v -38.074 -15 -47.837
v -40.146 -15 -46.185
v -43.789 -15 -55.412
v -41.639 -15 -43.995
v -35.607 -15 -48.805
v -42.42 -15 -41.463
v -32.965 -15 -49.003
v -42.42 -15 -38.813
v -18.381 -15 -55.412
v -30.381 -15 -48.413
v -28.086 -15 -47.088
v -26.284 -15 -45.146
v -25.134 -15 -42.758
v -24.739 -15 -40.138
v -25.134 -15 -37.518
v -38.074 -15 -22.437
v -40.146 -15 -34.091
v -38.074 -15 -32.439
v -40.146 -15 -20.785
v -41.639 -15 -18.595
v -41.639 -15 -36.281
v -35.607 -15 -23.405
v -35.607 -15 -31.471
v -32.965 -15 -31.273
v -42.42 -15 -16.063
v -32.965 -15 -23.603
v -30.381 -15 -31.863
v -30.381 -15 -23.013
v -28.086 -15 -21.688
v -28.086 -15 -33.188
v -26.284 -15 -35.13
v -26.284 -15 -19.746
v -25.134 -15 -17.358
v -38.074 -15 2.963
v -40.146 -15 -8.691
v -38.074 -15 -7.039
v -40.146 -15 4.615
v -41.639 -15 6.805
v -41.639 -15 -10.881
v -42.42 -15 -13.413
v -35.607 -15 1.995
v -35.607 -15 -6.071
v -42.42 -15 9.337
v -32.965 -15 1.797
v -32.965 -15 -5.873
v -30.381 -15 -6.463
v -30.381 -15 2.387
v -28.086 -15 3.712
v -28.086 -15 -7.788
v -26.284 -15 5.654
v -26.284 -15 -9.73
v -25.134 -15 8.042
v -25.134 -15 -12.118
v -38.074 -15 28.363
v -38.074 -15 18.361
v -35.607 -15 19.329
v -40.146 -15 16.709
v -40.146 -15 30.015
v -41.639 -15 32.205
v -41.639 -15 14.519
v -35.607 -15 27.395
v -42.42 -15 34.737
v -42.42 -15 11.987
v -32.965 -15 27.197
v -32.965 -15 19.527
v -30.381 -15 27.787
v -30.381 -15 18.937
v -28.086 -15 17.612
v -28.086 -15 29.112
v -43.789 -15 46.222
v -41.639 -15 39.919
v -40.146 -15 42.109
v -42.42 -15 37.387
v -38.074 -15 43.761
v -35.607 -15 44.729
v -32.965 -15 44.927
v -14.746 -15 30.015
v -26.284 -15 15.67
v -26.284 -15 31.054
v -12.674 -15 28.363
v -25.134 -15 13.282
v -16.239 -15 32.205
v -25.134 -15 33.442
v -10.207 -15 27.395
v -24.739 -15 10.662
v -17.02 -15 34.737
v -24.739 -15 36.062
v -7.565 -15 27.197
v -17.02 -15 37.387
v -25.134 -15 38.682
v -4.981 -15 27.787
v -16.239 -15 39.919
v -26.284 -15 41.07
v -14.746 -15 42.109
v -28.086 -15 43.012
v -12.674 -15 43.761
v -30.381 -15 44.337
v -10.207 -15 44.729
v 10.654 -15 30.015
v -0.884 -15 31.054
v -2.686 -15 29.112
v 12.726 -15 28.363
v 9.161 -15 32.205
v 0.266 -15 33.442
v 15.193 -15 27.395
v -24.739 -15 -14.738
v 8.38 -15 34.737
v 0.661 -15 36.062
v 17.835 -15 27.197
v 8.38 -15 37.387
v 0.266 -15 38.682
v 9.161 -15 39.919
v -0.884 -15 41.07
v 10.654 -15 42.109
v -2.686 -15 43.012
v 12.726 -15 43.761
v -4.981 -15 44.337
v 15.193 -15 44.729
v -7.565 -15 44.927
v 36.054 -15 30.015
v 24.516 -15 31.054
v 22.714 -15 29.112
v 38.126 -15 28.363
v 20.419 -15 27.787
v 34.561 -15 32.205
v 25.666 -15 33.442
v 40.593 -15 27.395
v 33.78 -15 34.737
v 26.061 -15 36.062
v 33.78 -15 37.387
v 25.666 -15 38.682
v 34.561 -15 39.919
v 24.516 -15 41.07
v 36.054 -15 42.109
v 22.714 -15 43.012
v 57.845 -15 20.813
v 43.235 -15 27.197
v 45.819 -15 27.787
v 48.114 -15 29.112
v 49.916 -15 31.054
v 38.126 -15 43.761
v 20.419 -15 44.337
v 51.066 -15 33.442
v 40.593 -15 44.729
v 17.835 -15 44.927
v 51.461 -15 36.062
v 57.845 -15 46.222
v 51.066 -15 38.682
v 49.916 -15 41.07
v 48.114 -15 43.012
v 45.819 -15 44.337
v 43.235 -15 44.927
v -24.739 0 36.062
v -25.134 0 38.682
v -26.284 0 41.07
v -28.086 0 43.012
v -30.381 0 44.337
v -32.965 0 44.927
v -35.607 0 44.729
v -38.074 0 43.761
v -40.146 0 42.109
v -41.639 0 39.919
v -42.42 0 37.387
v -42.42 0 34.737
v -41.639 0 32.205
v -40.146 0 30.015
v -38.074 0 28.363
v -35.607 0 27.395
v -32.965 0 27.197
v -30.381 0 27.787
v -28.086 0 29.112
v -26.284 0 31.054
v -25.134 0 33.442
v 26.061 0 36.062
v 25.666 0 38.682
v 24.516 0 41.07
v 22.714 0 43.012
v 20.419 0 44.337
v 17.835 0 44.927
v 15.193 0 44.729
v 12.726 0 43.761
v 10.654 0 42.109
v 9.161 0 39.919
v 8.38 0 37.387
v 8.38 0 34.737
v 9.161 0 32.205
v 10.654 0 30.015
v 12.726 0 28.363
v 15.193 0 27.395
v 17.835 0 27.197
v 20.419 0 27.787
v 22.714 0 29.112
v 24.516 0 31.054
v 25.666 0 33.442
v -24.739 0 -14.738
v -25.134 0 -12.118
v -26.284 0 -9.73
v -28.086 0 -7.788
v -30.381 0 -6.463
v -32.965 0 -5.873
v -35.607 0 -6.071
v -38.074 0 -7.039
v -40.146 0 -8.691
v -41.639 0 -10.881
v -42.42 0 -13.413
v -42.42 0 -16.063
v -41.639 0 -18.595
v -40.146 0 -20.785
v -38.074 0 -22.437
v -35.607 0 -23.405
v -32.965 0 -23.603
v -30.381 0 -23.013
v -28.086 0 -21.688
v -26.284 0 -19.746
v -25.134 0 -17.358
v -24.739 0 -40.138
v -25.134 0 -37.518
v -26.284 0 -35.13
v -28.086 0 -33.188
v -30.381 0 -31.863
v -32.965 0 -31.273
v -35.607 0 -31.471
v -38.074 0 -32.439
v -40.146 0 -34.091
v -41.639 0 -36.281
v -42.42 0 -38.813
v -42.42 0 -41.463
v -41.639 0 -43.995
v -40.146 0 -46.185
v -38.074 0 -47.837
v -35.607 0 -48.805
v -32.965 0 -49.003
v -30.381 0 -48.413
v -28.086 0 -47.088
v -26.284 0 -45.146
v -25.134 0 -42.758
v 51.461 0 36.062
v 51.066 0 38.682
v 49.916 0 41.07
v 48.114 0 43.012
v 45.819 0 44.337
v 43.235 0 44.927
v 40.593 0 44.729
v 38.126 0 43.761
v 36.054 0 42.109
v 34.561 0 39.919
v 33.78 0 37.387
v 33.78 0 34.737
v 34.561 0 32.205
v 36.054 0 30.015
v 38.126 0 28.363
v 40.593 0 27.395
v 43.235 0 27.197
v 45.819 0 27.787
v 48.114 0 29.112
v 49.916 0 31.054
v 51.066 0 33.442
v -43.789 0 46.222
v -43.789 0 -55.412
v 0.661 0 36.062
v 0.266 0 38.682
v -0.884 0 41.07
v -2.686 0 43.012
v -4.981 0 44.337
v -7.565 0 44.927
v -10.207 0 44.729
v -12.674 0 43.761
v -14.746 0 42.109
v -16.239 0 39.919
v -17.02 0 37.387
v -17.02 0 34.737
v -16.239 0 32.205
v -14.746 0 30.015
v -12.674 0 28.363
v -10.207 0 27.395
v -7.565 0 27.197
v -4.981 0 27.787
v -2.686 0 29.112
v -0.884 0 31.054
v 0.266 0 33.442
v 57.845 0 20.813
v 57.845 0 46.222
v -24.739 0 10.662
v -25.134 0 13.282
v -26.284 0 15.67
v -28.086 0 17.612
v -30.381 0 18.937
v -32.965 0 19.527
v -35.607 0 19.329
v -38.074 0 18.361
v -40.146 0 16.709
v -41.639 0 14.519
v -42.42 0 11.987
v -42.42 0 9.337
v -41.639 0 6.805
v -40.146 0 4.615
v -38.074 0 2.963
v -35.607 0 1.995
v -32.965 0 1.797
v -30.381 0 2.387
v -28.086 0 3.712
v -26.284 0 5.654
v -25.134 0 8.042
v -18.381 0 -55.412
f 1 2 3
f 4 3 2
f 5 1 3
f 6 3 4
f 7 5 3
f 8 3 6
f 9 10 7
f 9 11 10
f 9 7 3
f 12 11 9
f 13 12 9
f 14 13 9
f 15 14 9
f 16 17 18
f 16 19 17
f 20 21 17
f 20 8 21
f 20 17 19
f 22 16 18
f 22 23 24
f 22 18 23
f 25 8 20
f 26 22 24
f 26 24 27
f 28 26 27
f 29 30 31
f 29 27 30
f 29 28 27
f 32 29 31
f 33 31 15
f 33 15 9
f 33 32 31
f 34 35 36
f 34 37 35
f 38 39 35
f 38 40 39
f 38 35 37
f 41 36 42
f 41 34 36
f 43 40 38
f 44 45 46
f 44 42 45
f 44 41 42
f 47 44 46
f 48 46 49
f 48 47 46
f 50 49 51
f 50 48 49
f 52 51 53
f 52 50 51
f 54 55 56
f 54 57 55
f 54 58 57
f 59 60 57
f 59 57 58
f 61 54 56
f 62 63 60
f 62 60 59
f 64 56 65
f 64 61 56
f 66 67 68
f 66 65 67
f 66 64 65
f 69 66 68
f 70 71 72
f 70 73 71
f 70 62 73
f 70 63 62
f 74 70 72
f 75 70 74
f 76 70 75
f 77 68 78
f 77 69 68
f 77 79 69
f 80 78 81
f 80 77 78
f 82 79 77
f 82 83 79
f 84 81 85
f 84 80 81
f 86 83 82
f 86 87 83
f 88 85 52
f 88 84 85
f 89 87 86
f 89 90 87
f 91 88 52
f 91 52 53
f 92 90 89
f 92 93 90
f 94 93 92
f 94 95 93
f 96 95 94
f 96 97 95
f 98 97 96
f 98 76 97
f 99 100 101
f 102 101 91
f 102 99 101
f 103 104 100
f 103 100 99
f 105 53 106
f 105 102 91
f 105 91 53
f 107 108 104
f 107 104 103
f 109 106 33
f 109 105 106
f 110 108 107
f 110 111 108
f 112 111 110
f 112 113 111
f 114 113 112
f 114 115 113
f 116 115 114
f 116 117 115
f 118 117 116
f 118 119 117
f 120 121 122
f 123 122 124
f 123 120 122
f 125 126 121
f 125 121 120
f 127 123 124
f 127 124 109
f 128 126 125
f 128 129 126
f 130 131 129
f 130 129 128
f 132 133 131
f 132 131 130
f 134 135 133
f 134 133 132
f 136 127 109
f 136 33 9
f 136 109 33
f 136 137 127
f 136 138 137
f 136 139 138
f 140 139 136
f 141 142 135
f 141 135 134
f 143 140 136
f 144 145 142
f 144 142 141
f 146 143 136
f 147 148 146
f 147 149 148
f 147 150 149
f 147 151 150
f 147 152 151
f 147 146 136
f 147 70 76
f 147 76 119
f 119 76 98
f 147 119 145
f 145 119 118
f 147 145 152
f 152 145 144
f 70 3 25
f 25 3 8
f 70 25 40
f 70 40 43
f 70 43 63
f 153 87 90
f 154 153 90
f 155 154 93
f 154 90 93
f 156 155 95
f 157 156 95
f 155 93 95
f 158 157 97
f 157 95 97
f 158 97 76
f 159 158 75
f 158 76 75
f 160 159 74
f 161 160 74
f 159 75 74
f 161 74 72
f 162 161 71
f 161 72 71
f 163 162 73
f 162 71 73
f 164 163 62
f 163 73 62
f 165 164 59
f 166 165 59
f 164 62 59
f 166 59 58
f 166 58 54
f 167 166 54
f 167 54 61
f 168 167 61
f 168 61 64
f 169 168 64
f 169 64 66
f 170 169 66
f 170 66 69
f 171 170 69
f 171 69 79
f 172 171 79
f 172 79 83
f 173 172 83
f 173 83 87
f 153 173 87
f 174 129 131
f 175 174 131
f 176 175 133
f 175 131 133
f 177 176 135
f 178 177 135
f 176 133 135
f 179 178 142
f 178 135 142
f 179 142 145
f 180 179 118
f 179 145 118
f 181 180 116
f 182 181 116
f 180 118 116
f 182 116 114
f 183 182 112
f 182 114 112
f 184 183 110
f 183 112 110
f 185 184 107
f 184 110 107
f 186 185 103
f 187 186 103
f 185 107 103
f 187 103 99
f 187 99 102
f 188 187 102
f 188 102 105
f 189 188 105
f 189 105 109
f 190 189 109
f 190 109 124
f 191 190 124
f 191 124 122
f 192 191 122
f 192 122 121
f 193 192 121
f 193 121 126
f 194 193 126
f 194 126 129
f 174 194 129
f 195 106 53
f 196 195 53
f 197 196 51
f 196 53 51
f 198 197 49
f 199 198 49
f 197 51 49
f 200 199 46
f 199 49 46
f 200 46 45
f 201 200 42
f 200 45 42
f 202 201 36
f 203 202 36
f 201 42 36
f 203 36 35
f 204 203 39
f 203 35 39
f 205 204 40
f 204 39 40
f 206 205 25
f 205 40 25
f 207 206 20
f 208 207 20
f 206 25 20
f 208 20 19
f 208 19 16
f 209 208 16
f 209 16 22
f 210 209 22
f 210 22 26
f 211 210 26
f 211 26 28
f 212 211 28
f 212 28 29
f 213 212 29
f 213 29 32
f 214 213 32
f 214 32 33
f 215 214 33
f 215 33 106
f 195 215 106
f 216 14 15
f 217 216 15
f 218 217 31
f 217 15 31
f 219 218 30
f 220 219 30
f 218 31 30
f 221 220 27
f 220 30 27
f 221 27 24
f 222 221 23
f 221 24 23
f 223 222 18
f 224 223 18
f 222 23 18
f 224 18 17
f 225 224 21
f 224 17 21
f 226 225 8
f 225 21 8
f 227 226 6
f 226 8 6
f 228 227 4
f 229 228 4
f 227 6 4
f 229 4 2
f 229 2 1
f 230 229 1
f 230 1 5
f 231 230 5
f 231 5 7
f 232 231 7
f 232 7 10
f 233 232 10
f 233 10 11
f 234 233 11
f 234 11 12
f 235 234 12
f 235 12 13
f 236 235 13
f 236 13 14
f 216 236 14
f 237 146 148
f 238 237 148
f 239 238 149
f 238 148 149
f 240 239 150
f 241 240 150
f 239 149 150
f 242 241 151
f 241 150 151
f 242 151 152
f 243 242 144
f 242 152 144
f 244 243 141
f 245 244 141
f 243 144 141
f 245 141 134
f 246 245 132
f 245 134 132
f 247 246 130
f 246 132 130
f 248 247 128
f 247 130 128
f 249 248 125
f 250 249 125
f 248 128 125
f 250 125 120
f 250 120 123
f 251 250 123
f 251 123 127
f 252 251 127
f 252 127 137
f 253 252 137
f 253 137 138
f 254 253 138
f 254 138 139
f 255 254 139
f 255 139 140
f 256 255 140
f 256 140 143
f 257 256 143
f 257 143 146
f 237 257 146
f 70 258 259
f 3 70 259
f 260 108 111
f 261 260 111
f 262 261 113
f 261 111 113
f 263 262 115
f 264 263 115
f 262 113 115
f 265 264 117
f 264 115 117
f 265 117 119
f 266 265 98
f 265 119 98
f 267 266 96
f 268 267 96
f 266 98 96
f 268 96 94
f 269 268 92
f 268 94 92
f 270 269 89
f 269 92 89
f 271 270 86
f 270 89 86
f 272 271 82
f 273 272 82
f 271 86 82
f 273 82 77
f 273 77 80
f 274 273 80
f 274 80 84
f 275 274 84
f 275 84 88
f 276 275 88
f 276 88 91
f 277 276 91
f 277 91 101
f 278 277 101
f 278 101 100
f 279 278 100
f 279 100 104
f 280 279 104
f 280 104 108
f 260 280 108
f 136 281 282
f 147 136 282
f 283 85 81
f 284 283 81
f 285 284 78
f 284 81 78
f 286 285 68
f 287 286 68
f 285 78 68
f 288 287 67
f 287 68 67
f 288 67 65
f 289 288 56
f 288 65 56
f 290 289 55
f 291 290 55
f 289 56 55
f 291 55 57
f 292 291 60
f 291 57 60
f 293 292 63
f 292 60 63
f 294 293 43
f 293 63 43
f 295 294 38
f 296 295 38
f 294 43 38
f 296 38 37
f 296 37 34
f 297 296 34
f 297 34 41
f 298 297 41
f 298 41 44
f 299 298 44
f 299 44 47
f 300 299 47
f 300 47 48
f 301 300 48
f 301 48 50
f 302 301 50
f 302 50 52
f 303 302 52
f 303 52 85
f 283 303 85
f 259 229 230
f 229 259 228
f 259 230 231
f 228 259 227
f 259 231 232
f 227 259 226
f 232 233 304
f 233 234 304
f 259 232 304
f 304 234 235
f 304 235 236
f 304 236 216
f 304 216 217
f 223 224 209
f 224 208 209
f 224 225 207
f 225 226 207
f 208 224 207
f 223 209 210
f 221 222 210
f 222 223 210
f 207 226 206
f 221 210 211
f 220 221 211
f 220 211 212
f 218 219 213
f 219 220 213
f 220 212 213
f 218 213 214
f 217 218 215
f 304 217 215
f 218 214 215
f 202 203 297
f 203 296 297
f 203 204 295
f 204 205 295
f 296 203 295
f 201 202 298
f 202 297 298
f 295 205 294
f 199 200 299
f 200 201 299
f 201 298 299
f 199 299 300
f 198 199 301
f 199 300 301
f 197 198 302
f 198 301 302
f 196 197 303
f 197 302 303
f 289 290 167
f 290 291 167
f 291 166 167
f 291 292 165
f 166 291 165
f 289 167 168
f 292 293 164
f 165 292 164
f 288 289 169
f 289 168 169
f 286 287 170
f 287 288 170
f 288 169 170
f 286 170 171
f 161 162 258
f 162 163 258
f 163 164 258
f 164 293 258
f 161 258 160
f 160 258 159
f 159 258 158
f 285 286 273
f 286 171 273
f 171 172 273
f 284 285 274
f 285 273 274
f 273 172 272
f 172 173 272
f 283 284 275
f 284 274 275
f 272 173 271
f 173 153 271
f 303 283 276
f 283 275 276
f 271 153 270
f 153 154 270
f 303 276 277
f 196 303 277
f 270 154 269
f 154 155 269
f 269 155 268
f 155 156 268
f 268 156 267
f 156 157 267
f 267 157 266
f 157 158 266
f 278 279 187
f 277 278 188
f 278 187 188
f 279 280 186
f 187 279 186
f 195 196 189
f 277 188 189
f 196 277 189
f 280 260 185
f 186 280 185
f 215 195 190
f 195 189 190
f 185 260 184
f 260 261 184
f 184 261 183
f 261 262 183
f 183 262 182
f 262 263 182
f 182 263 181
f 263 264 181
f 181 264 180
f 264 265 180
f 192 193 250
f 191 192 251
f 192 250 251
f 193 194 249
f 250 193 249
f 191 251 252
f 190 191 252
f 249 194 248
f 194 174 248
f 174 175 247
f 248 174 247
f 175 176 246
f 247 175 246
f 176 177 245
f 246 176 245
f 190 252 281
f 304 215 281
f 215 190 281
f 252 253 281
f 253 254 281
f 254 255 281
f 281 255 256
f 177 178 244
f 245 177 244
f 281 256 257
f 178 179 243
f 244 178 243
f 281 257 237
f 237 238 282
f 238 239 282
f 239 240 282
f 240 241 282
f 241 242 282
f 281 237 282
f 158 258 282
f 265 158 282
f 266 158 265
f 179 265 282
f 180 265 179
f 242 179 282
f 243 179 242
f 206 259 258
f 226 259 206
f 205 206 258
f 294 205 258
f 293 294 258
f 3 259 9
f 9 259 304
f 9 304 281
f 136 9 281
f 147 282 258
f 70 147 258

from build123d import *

# Parameters (mm, degrees)
F1_DEPTH = 15
F2_R     = 8.89
F3_DEPTH = 508


with BuildPart() as f1:
    # F0 (on Front) → F1 (new body)
    with BuildSketch(Plane.XZ):
        Polygon((57.845067, 46.221994), (-43.789256, 46.221994), (-43.789256, -55.412333), (-18.380675, -55.412333), (57.845067, 20.813413), align=None)
    extrude(amount=F1_DEPTH)

    # F2 (on face) → F3 (cut)
    with BuildSketch(Plane.XZ.offset(15)):
        with Locations((-33.629256, 36.061994)):
            Circle(F2_R)
        with Locations((-33.629256, 10.661994)):
            Circle(F2_R)
        with Locations((-33.629256, -14.738006)):
            Circle(F2_R)
        with Locations((-33.629256, -40.138006)):
            Circle(F2_R)
        with Locations((-8.229256, 36.061994)):
            Circle(F2_R)
        with Locations((17.170744, 36.061994)):
            Circle(F2_R)
        with Locations((42.570744, 36.061994)):
            Circle(F2_R)
    extrude(amount=-F3_DEPTH, mode=Mode.SUBTRACT)


solid = f1.part
